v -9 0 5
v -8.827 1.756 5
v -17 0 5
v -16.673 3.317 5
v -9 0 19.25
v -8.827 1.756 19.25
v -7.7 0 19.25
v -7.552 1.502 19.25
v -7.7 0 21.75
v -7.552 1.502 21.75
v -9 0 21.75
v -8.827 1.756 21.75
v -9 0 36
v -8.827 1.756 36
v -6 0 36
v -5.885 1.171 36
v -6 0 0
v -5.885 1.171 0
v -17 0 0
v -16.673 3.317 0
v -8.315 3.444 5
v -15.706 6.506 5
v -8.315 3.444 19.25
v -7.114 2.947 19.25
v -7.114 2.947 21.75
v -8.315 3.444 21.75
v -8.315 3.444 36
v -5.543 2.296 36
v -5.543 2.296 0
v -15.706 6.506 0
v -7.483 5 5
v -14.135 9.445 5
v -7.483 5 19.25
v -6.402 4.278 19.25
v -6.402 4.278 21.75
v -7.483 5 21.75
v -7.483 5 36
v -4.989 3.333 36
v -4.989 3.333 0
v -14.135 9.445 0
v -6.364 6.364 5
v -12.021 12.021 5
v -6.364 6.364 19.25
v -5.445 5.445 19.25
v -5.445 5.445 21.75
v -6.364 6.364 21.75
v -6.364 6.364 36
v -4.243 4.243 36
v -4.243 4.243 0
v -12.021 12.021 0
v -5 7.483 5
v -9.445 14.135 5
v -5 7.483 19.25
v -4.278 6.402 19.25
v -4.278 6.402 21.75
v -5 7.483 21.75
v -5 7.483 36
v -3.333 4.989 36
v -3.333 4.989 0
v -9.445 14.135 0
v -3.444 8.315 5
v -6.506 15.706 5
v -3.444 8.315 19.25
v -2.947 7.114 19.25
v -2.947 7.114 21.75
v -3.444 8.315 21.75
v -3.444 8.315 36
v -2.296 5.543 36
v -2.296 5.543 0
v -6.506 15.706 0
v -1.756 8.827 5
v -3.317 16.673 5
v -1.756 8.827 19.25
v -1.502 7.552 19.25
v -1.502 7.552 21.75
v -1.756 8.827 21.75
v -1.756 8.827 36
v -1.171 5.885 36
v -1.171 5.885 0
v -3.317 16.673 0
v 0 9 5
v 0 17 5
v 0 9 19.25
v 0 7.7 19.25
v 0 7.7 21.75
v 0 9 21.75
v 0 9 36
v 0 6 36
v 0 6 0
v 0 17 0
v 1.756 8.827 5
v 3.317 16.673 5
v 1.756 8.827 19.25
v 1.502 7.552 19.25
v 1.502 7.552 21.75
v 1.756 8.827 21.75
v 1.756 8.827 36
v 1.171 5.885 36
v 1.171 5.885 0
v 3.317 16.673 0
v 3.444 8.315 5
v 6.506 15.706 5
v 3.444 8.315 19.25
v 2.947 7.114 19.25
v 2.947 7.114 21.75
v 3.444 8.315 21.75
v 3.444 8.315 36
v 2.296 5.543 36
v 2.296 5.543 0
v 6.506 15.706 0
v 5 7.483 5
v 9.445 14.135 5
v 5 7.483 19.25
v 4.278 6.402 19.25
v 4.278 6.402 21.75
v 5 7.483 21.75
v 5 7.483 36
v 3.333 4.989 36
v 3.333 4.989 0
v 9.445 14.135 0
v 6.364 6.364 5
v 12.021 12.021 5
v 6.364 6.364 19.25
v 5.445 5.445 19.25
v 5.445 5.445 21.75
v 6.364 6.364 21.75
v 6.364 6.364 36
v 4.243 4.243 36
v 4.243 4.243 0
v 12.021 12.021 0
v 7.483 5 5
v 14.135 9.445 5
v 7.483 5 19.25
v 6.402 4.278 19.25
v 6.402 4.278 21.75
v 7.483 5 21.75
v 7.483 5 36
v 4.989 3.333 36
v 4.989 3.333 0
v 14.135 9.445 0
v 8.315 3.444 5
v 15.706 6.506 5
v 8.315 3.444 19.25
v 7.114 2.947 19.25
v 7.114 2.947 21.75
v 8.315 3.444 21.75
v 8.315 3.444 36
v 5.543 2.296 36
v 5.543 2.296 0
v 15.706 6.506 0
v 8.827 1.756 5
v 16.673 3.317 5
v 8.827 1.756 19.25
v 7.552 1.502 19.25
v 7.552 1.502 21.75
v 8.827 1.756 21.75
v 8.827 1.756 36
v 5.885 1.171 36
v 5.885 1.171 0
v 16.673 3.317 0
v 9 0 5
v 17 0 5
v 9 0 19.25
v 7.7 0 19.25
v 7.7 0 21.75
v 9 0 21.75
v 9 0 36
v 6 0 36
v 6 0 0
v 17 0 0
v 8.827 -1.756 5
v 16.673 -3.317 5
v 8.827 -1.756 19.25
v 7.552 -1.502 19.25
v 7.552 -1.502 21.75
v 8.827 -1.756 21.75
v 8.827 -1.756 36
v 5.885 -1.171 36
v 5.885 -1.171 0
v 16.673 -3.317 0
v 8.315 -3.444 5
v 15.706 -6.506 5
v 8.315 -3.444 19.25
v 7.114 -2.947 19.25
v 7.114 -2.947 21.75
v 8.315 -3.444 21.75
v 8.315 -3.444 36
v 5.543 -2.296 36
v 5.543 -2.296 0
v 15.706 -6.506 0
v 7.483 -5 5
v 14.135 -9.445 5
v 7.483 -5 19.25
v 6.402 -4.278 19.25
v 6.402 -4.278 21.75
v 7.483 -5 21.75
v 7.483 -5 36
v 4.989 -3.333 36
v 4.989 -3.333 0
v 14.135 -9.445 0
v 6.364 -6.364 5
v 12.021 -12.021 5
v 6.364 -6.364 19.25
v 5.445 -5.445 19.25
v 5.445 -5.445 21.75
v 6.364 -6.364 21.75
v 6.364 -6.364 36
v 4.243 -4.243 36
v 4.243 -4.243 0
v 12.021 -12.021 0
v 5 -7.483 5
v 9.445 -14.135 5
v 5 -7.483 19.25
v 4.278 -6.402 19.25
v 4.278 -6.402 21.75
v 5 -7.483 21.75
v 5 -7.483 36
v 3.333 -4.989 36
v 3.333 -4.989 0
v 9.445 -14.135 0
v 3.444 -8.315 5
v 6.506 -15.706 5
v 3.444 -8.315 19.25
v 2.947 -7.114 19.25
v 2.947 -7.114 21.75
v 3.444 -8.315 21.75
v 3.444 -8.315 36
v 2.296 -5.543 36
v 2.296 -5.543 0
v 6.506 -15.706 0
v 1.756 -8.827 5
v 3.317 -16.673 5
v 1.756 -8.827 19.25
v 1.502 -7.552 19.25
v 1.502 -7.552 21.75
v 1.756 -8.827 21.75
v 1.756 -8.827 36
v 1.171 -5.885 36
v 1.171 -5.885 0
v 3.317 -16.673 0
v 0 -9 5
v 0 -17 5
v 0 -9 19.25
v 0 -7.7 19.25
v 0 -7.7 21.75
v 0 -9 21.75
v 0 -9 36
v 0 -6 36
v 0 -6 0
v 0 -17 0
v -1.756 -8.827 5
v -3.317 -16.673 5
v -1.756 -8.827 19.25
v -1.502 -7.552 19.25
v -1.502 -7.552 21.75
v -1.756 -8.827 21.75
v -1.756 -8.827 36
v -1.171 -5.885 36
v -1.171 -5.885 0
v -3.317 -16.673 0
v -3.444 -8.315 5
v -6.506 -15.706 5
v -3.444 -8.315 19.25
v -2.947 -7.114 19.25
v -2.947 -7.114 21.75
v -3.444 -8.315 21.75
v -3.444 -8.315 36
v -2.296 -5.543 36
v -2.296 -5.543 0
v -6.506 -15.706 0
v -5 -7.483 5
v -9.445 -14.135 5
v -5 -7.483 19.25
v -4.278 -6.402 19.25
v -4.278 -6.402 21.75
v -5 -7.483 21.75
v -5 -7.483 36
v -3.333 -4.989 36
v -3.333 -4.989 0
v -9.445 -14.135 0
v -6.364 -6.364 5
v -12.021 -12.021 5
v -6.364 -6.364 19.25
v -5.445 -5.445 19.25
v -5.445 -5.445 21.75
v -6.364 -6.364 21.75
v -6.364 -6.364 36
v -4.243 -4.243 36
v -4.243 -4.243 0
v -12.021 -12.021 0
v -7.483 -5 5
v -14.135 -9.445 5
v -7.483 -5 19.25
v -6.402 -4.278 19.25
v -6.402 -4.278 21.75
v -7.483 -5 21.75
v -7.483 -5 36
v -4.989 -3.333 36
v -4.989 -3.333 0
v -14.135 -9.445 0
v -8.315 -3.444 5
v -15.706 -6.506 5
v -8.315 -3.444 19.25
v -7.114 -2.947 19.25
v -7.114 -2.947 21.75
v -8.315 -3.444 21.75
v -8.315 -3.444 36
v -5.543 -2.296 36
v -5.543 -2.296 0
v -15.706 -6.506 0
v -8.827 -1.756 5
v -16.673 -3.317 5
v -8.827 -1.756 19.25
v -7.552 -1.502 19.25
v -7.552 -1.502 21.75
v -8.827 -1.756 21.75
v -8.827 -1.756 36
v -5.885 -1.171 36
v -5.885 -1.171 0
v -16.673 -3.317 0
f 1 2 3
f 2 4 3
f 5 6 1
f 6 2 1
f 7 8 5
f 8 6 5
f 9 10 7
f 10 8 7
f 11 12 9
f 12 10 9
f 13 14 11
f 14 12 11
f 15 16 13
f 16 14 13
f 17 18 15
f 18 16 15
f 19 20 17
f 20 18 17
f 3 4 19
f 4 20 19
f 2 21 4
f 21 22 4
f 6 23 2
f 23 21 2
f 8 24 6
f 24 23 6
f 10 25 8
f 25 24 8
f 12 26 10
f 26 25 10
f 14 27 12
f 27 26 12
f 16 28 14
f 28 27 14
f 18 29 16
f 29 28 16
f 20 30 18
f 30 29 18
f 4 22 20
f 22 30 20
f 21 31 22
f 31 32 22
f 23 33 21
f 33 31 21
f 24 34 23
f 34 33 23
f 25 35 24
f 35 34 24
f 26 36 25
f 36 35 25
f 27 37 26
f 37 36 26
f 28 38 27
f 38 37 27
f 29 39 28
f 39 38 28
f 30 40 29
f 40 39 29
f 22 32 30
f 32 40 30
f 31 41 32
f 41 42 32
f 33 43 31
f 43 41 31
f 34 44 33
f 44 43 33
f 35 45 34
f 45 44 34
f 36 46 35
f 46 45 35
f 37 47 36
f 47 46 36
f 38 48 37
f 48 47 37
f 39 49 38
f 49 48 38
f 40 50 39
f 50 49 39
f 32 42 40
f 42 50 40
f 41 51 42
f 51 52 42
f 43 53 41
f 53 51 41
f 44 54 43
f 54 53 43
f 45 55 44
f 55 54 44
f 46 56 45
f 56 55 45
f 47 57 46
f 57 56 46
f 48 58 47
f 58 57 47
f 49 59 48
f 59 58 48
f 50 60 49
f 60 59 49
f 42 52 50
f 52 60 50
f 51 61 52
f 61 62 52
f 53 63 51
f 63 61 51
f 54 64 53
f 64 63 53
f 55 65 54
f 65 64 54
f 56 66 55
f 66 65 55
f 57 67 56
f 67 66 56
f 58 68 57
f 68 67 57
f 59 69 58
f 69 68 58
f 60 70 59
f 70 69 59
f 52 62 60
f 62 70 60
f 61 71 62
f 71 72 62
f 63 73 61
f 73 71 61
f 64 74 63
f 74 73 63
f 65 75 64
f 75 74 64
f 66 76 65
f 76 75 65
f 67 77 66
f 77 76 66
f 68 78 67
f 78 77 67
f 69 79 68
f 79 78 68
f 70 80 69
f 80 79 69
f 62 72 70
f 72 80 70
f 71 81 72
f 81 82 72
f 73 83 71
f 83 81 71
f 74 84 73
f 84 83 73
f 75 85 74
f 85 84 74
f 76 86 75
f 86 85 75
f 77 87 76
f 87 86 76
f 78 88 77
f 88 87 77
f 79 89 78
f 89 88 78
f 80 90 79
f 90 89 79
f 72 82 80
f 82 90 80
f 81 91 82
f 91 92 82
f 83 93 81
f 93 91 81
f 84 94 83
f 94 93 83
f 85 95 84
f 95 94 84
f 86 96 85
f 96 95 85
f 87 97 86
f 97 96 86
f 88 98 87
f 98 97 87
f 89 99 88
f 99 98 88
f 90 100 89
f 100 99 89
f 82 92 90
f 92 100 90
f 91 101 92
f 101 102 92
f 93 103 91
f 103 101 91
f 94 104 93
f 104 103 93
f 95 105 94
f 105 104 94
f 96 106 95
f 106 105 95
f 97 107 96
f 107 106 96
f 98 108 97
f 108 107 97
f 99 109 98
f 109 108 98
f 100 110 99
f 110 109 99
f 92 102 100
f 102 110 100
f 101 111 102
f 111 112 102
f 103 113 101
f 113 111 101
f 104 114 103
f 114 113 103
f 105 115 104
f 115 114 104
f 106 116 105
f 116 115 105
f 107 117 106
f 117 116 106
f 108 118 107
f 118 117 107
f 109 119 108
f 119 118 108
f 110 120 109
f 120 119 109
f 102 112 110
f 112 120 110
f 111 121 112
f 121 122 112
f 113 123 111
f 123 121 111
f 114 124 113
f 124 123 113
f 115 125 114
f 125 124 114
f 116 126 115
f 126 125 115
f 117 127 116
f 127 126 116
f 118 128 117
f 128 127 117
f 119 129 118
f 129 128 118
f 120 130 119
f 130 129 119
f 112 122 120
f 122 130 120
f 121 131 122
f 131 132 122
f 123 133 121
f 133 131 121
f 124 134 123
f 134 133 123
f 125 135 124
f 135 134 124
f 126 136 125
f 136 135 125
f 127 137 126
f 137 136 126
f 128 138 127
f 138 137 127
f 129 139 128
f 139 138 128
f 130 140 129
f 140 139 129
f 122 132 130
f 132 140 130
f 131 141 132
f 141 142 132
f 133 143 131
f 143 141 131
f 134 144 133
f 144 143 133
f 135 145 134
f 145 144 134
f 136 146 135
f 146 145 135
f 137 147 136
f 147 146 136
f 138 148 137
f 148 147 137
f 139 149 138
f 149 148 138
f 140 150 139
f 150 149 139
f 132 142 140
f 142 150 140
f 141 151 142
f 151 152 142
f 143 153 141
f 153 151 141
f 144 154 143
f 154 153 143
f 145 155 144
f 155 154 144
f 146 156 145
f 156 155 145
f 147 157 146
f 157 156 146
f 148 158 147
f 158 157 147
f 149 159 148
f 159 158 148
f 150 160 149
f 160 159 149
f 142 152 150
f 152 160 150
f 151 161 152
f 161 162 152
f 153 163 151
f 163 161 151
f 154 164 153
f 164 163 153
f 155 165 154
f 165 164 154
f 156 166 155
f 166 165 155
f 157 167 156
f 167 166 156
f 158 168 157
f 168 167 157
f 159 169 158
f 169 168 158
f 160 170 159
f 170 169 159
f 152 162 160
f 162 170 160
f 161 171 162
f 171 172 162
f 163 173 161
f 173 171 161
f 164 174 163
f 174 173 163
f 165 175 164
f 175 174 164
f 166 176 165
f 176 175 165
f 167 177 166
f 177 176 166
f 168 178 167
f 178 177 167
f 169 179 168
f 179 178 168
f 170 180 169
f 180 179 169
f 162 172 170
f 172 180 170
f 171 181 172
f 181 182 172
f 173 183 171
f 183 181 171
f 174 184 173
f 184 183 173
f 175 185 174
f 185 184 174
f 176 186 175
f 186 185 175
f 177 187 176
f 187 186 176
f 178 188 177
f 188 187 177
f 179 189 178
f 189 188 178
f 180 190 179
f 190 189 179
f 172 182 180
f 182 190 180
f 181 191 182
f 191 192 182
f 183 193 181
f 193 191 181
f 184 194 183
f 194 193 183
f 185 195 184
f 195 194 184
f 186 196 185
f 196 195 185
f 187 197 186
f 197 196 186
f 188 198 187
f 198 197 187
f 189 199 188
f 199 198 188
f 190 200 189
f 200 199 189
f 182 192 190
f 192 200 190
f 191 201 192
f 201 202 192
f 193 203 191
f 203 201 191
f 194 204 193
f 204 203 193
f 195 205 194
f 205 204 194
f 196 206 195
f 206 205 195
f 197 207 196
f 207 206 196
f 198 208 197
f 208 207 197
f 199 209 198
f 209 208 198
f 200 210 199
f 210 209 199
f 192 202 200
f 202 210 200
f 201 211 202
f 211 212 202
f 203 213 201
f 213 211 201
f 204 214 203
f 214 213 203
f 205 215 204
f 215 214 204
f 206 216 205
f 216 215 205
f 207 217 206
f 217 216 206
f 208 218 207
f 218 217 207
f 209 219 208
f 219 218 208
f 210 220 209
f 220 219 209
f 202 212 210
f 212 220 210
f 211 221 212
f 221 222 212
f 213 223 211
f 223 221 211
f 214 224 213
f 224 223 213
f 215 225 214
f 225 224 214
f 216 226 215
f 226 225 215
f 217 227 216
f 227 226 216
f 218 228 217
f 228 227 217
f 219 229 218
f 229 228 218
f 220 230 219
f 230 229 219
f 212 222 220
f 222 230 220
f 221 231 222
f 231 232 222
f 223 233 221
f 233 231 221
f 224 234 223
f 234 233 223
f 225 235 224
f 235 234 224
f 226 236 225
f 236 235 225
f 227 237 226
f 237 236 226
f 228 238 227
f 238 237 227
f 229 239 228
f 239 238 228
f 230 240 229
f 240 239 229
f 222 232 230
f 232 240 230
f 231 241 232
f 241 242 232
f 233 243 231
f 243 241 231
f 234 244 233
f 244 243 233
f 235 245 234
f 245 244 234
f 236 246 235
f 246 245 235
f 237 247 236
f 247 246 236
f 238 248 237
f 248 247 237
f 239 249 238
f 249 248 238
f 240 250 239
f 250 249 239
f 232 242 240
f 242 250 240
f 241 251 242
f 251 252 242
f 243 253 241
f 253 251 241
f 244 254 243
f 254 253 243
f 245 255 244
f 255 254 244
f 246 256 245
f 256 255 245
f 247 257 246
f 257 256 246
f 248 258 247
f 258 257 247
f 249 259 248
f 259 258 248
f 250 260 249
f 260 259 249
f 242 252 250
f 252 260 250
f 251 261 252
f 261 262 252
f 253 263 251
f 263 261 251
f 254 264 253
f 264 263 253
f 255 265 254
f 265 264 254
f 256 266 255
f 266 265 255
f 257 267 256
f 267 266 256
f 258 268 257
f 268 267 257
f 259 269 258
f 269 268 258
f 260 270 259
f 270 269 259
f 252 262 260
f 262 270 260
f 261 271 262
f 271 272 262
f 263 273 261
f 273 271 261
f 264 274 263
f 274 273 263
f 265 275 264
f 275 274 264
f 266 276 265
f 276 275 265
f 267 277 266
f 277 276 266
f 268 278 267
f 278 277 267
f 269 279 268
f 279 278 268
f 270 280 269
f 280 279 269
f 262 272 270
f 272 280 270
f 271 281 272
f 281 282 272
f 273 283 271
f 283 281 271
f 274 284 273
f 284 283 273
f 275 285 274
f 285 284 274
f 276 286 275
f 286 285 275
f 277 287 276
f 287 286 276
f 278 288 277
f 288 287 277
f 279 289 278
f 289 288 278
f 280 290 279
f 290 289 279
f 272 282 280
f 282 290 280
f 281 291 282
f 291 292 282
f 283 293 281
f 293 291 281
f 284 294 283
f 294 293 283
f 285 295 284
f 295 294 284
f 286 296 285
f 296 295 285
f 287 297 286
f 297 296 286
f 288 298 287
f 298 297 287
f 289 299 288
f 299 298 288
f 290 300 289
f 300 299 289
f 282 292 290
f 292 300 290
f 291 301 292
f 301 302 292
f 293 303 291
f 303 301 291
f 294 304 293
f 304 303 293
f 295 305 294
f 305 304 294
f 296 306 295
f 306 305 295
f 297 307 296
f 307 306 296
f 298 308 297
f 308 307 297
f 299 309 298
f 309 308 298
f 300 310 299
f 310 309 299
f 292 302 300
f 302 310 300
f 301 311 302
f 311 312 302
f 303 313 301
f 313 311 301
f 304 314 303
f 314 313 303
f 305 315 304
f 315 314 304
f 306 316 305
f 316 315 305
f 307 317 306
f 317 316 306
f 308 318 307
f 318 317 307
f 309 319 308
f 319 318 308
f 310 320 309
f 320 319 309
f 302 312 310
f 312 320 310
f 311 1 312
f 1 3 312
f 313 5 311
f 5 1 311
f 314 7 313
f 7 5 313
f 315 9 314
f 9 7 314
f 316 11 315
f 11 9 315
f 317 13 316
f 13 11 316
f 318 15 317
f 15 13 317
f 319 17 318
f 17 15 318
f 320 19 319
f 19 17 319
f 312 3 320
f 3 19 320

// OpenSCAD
$fn = 32;

// ----------------------------------------------------------------------
// Grooved revolve: flanged, bore R6
// ----------------------------------------------------------------------

// --- parameters (mm) ---
bore_r = 6;               // bore radius
outer_r = 9;              // outer radius of the body
total_h = 36;             // overall height, Z
wall = 3;                 // radial wall thickness
groove_w = 2.5;           // groove width
groove_d = 1.3;           // groove depth
grooves = 1;              // number of outer grooves
flange_r = 17;            // flange radius
flange_h = 5;             // flange height
fit_tol = 0.1;            // declared fit tolerance (prompt contract)
free_tol = 0.5;           // declared free tolerance (prompt contract)

bbox_x = 2 * flange_r;  // full diameter
bore_d = 2 * bore_r;  // bore diameter
body_d = 2 * outer_r;  // body diameter
flange_d = 2 * flange_r;  // flange diameter
revolve_angle = 360;  // full turn around the Z axis

profile = [[6, 0], [9, 0], [17, 0], [17, 5], [9, 5], [9, 19.25], [7.7, 19.25], [7.7, 21.75], [9, 21.75], [9, 36], [6, 36]];  // primary outline, 11 points, counter clockwise

// --- the one profile operation ---
rotate_extrude(angle = revolve_angle) polygon(points = profile);
